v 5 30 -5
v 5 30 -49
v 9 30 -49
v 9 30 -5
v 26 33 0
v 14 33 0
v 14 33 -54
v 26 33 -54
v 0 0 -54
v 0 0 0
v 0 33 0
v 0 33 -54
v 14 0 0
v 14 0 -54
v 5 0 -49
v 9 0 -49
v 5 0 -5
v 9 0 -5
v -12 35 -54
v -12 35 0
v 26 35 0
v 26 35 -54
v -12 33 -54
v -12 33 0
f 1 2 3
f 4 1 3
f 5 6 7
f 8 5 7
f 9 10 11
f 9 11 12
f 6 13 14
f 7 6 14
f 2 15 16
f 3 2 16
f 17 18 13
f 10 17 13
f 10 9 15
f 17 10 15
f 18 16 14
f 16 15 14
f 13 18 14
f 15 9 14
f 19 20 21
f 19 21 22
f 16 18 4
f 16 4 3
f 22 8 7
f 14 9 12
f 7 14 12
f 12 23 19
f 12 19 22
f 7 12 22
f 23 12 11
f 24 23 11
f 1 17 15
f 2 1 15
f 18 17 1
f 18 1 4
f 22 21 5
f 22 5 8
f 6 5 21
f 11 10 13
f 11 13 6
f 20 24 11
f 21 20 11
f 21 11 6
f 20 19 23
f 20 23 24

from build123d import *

# Parameters (mm, degrees)
SKETCH1_W           = 14
SKETCH1_H           = 54
BOSS_EXTRUDE2_DEPTH = 35
SHELL2_T            = -5
SKETCH2_W           = 54
SKETCH2_H           = 2
BOSS_EXTRUDE3_DEPTH = 12
SKETCH3_W           = 54
SKETCH3_H           = 2
BOSS_EXTRUDE4_DEPTH = 12


with BuildPart() as part:
    # Sketch1 → Boss-Extrude2 (new body)
    with BuildSketch(Plane(origin=(0, 0, 0), x_dir=(1, 0, 0), z_dir=(0, 1, 0))):
        with Locations((7, 27)):
            Rectangle(SKETCH1_W, SKETCH1_H)
    extrude(amount=BOSS_EXTRUDE2_DEPTH)

    # Shell2
    shell2_openings = [part.faces().sort_by_distance(p)[0] for p in [
        (7, 0, -27),
    ]]
    offset(amount=SHELL2_T, openings=shell2_openings, kind=Kind.INTERSECTION)

    # Sketch2 → Boss-Extrude3 (add)
    with BuildSketch(Plane.ZY):
        with Locations((-27, 34)):
            Rectangle(SKETCH2_W, SKETCH2_H)
    extrude(amount=BOSS_EXTRUDE3_DEPTH)

    # Sketch3 → Boss-Extrude4 (add)
    with BuildSketch(Plane(origin=(14, 0, 0), x_dir=(0, 0, -1), z_dir=(1, 0, 0))):
        with Locations((27, 34)):
            Rectangle(SKETCH3_W, SKETCH3_H)
    extrude(amount=BOSS_EXTRUDE4_DEPTH)


solid = part.part
